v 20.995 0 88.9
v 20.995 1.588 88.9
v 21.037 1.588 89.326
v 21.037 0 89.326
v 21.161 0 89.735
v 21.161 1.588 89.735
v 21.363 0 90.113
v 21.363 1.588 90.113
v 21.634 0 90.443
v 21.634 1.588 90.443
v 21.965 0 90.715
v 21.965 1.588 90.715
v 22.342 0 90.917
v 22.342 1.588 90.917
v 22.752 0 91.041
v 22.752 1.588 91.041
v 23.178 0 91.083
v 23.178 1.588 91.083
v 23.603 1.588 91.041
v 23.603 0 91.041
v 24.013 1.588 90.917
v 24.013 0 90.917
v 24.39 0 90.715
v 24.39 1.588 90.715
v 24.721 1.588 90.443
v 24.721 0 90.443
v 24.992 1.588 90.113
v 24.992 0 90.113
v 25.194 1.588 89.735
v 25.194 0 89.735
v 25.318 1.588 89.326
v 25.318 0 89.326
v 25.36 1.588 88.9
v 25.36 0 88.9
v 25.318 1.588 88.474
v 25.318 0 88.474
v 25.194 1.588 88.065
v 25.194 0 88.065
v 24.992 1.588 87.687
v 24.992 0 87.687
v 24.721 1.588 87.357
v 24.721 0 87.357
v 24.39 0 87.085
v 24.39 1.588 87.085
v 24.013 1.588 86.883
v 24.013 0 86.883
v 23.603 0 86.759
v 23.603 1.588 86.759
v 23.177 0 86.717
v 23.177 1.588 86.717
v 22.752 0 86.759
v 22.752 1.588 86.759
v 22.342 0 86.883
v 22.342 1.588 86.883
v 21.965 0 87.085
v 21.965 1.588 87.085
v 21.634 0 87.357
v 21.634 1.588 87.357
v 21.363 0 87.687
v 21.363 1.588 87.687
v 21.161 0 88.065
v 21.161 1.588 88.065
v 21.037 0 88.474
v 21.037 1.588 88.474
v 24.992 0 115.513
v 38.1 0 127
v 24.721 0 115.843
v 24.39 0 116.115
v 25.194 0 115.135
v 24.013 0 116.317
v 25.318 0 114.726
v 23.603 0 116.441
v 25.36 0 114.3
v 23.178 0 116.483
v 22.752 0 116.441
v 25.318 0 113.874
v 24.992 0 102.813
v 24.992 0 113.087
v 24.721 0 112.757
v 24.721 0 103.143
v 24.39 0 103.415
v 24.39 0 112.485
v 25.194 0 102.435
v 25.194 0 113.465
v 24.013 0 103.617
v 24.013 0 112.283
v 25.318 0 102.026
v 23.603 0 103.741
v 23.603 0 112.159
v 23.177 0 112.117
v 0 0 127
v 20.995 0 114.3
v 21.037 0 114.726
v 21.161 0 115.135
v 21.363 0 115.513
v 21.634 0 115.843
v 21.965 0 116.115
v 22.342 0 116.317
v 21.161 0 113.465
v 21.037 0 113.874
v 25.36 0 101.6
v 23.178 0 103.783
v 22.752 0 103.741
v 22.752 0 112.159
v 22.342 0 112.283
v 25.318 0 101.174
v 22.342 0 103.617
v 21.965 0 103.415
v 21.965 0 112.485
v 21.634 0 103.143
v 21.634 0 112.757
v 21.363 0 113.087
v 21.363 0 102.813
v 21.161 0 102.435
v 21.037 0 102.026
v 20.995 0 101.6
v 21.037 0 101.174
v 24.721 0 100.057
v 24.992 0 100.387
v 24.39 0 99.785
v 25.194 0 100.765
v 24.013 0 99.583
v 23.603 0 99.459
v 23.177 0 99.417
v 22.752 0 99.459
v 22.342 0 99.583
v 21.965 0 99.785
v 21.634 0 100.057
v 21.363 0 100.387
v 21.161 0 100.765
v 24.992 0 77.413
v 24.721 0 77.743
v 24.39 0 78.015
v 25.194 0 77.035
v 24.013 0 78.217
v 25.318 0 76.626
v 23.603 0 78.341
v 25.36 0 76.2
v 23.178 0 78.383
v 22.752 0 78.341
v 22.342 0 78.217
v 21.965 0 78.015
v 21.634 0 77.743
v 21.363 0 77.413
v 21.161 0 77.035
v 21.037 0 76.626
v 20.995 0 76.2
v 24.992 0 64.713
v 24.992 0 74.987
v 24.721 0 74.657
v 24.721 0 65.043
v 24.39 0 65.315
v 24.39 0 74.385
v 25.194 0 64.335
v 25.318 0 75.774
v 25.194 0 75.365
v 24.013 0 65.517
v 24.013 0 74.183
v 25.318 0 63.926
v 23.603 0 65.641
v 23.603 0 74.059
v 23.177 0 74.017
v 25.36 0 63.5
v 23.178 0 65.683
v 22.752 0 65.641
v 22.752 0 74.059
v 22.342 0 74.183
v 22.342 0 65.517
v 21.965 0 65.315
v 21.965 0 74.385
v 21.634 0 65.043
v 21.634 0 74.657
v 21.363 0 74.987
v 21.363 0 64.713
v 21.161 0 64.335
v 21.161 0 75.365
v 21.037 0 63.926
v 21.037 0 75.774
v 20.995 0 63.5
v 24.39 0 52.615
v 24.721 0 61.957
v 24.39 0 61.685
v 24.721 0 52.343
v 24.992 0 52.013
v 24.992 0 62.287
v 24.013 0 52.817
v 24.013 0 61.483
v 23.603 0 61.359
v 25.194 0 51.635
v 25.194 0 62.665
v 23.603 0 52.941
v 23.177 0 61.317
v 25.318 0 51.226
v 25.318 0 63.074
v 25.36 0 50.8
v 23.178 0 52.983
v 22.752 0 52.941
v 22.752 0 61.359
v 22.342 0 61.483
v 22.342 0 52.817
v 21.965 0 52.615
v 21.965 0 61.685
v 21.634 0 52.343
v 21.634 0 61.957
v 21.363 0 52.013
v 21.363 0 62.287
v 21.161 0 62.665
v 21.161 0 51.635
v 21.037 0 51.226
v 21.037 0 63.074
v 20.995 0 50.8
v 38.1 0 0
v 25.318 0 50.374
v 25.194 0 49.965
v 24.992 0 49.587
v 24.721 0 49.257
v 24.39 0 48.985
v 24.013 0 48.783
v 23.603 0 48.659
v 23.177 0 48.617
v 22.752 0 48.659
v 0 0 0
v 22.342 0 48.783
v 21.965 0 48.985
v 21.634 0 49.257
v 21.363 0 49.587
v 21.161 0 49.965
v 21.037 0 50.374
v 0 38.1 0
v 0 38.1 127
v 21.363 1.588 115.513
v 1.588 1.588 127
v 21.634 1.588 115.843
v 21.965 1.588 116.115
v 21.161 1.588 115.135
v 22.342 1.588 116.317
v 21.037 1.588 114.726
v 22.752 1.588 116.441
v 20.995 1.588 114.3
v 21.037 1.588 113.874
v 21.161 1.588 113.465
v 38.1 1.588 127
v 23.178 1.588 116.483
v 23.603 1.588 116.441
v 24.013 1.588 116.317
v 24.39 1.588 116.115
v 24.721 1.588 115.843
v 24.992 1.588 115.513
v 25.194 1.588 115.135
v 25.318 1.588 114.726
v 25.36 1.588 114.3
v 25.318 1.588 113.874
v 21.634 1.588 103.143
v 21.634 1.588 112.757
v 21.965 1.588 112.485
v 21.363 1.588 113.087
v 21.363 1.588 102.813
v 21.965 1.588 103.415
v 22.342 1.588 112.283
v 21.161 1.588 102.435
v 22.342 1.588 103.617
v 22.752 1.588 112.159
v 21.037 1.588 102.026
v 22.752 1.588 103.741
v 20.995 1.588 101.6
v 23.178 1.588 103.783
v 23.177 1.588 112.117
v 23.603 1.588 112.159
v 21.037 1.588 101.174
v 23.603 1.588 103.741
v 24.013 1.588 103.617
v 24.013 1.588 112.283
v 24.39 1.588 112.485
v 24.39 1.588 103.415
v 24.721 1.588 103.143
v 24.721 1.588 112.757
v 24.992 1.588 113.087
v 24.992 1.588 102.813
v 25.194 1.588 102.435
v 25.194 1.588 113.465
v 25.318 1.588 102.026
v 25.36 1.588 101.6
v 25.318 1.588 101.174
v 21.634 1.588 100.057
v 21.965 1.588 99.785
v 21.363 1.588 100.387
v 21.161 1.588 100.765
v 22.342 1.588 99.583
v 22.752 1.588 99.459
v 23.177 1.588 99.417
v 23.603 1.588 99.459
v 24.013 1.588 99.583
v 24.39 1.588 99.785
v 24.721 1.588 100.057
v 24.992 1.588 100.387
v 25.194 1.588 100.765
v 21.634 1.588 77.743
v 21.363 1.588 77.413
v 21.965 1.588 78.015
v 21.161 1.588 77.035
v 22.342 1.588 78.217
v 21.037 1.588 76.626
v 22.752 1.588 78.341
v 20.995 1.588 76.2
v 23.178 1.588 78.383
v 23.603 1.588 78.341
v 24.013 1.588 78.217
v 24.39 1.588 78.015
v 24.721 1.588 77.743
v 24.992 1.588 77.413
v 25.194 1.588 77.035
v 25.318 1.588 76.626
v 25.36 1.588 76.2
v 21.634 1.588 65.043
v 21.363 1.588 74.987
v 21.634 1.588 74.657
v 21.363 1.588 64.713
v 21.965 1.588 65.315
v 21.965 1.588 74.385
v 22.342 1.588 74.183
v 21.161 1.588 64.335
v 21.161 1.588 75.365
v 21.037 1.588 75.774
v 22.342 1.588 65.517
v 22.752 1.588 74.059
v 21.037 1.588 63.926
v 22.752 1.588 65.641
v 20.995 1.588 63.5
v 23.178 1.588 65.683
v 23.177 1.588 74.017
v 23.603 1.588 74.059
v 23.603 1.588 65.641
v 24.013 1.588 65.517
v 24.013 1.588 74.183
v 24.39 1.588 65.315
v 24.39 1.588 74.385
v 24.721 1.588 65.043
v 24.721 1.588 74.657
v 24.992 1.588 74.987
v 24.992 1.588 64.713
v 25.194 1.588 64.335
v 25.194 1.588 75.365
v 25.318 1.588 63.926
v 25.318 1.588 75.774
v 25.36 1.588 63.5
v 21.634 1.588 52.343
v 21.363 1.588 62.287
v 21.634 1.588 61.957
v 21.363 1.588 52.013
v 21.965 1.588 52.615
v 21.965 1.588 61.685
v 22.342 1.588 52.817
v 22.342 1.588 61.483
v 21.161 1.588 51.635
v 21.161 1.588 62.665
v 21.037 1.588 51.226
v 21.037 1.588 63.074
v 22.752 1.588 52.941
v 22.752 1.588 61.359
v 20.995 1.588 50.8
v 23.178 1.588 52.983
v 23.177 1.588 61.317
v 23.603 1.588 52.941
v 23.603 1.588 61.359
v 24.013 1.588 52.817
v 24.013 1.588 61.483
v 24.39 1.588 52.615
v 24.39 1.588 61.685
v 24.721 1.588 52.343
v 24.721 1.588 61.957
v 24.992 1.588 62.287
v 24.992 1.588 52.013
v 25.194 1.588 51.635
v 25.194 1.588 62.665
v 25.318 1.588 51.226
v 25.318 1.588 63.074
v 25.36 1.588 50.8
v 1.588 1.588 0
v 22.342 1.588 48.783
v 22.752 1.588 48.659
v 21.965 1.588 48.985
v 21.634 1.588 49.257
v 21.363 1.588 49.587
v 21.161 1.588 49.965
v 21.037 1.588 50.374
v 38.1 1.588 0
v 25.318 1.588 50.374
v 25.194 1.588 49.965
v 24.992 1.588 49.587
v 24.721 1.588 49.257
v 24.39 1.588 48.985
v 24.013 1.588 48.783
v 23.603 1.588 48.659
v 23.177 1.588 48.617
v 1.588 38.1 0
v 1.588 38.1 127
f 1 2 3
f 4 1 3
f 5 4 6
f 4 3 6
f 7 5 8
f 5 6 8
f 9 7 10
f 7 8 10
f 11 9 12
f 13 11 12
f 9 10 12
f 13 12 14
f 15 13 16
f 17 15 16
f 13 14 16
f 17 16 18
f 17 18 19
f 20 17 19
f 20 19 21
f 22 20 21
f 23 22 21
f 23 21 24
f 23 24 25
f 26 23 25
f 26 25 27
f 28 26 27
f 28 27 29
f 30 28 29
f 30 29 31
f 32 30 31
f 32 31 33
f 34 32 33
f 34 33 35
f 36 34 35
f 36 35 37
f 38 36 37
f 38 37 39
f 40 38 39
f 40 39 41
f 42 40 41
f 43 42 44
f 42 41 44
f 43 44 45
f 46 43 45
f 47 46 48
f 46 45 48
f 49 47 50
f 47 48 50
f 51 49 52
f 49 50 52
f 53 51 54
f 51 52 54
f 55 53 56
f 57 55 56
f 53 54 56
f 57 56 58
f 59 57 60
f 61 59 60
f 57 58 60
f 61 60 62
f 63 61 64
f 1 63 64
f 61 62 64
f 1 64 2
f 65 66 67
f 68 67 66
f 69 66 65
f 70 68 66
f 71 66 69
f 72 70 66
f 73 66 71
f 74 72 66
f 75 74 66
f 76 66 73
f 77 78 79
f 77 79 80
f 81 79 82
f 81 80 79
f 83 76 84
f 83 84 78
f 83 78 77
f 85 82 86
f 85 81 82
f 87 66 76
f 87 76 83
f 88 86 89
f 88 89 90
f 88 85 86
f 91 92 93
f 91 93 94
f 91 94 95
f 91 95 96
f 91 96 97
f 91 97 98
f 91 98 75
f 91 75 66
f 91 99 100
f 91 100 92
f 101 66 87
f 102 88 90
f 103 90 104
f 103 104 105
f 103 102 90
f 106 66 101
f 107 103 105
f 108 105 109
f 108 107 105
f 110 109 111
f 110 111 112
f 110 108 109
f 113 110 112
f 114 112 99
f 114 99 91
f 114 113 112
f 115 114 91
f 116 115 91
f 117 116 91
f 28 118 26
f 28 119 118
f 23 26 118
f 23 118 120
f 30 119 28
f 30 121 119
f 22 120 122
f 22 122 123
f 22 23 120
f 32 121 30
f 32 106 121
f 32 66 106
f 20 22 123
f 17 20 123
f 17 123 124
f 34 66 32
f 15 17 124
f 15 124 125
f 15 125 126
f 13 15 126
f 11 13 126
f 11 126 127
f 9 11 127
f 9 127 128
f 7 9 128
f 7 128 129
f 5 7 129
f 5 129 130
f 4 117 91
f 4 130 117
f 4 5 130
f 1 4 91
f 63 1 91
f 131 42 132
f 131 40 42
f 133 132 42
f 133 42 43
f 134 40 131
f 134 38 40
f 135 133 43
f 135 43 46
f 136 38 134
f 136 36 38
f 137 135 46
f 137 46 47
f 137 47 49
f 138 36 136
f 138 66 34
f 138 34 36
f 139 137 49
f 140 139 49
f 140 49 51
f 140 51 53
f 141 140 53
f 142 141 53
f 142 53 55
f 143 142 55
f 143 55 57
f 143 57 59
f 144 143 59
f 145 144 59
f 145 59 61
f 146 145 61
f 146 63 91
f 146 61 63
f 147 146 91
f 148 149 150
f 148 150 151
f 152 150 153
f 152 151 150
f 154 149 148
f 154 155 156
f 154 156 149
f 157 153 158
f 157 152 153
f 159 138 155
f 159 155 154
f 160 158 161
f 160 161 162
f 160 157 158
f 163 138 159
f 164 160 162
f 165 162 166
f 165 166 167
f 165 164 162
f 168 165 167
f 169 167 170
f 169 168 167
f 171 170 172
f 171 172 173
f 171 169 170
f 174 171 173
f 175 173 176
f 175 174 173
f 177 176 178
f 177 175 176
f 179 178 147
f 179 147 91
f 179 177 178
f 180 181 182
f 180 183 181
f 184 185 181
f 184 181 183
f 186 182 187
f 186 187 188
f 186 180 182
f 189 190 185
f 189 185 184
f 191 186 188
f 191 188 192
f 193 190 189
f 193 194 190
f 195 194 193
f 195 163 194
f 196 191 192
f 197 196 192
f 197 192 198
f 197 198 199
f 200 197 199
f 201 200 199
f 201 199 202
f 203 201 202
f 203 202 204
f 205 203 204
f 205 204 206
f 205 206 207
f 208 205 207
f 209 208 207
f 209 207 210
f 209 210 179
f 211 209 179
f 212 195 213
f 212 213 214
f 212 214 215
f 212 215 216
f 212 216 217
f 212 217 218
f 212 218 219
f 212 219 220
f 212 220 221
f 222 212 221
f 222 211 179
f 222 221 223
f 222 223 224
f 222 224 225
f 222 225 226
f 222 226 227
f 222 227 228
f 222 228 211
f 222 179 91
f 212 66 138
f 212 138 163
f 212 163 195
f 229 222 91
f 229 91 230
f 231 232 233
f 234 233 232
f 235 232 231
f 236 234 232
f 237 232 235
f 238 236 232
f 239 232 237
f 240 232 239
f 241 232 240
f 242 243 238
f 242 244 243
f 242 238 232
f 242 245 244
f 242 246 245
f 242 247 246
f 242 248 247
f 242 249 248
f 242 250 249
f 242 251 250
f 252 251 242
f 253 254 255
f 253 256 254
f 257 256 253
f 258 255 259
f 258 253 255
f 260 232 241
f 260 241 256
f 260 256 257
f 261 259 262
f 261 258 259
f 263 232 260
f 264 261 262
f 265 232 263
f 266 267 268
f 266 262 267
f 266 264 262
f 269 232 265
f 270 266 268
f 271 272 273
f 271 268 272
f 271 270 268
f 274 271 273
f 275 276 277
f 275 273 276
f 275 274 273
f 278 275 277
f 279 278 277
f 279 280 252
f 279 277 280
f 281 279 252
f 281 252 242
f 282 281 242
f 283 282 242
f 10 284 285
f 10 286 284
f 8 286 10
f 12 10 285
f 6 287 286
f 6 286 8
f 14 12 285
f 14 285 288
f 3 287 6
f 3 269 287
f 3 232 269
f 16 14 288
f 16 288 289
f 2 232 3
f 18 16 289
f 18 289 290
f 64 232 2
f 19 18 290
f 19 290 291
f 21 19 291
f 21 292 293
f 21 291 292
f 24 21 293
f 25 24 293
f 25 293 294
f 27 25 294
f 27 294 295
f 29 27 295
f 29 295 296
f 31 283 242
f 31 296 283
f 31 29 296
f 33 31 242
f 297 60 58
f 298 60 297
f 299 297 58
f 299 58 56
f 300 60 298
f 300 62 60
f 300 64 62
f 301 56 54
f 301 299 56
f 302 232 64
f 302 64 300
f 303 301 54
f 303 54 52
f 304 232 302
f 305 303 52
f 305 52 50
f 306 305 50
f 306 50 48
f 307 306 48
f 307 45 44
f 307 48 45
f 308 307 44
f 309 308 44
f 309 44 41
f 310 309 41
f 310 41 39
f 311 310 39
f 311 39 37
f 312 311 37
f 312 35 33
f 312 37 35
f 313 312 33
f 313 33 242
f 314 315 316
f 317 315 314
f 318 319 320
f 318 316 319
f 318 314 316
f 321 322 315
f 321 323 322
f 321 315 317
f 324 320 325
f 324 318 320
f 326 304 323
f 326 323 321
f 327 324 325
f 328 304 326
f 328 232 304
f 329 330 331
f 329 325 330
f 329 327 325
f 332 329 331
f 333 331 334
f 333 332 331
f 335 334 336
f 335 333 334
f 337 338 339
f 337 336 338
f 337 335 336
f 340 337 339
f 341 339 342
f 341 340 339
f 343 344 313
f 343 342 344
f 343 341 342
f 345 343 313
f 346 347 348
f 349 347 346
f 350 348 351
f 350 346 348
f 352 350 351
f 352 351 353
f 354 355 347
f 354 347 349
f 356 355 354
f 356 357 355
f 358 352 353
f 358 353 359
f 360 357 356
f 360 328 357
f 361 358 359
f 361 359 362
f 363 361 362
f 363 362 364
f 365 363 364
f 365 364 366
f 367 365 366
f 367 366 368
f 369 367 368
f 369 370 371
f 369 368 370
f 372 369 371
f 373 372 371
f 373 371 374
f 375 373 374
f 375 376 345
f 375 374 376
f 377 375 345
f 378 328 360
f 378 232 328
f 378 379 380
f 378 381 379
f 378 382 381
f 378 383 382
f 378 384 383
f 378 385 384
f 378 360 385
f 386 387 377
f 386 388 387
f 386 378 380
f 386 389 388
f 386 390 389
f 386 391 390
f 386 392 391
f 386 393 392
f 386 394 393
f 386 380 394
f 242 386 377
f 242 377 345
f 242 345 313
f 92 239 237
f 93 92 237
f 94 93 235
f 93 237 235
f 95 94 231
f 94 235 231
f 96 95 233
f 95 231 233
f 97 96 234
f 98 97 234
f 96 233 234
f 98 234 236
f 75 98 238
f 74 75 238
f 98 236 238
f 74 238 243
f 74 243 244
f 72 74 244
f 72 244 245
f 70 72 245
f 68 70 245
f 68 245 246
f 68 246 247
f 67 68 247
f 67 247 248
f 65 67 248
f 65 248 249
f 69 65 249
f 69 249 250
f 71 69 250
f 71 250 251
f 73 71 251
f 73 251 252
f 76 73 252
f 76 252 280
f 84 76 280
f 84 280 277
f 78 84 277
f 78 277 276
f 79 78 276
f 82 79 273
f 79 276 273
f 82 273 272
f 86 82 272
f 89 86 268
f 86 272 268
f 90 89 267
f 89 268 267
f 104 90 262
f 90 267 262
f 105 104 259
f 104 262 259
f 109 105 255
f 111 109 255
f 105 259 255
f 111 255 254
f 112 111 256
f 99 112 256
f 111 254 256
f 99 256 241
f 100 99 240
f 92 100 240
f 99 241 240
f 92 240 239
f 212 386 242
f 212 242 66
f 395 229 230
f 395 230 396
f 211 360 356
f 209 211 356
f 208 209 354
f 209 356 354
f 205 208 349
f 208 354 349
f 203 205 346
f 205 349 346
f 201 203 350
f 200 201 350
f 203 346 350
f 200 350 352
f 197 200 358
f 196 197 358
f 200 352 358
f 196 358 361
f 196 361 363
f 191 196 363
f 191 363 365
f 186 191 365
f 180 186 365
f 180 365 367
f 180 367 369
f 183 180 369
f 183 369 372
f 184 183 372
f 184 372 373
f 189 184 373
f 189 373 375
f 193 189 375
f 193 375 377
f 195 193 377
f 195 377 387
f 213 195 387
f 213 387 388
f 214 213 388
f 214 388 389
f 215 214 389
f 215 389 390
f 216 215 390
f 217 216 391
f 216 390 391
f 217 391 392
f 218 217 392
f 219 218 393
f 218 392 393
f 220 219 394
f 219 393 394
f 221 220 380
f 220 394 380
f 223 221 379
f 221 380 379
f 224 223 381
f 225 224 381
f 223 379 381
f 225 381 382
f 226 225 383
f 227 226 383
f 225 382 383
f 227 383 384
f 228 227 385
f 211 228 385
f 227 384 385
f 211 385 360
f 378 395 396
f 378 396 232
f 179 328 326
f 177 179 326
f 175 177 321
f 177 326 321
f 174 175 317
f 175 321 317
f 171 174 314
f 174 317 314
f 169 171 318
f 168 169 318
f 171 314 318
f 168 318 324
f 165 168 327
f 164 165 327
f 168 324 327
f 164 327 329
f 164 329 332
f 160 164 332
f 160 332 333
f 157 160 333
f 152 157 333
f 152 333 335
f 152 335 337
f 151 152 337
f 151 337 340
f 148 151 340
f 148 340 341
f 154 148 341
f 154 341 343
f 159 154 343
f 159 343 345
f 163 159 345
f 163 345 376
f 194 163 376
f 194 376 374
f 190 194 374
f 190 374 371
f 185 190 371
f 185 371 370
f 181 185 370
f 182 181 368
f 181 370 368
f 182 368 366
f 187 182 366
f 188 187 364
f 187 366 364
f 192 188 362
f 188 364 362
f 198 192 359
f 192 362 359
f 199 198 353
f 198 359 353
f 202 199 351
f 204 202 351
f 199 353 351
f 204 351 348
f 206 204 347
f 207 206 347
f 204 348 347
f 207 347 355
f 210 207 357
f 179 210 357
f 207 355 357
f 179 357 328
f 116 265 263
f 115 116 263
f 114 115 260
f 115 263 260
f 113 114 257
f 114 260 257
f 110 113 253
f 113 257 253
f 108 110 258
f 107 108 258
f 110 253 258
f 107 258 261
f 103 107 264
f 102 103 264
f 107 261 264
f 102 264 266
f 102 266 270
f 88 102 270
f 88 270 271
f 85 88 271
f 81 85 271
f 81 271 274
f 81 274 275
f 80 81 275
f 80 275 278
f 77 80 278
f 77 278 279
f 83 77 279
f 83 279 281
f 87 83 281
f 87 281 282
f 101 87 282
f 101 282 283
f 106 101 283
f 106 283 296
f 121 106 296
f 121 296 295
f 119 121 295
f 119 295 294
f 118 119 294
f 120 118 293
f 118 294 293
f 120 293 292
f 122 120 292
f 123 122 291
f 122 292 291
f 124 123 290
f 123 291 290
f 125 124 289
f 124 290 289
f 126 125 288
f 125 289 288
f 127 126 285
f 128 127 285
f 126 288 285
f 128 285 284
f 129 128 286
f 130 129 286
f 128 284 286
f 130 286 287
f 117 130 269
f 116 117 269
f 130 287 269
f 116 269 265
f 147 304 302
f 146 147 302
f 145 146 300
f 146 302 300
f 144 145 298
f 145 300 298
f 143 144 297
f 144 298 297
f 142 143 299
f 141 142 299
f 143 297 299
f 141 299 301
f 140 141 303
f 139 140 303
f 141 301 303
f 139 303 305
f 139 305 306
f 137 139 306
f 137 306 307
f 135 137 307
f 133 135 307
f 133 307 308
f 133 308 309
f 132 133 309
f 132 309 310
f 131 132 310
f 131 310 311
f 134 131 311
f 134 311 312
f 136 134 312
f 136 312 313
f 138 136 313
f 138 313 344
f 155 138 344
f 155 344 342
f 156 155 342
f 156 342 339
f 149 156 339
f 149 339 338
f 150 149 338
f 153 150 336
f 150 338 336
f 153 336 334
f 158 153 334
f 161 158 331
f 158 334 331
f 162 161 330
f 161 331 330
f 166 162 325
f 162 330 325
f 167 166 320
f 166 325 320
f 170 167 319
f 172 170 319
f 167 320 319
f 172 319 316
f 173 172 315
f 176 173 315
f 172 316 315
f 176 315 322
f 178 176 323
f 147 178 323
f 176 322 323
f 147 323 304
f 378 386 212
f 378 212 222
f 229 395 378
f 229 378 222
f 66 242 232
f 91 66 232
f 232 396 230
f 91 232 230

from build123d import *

# Parameters (mm, degrees)
BOSS_EXTRUDE1_DEPTH = 127
SKETCH2_R           = 2.1828125
CUT_EXTRUDE1_DEPTH  = 127


with BuildPart() as part:
    # Sketch1 → Boss-Extrude1 (new body)
    with BuildSketch(Plane.XY):
        Polygon((0, 0), (0, 38.1), (1.5875, 38.1), (1.5875, 1.5875), (38.1, 1.5875), (38.1, 0), align=None)
    extrude(amount=BOSS_EXTRUDE1_DEPTH)

    # Sketch2 → Cut-Extrude1 (cut)
    with BuildSketch(Plane(origin=(0, 1.5875, 0), x_dir=(1, 0, 0), z_dir=(0, 1, 0))):
        with Locations(Location((23.1775, -114.3, 0), (0, 0, 180))):
            Circle(SKETCH2_R)
        with Locations(Location((23.1775, -101.6, 0), (0, 0, 180))):
            Circle(SKETCH2_R)
        with Locations(Location((23.1775, -88.9, 0), (0, 0, 180))):
            Circle(SKETCH2_R)
        with Locations(Location((23.1775, -76.2, 0), (0, 0, 180))):
            Circle(SKETCH2_R)
        with Locations(Location((23.1775, -63.5, 0), (0, 0, 180))):
            Circle(SKETCH2_R)
        with Locations(Location((23.1775, -50.8, 0), (0, 0, 180))):
            Circle(SKETCH2_R)
    extrude(amount=-CUT_EXTRUDE1_DEPTH, mode=Mode.SUBTRACT)


solid = part.part
